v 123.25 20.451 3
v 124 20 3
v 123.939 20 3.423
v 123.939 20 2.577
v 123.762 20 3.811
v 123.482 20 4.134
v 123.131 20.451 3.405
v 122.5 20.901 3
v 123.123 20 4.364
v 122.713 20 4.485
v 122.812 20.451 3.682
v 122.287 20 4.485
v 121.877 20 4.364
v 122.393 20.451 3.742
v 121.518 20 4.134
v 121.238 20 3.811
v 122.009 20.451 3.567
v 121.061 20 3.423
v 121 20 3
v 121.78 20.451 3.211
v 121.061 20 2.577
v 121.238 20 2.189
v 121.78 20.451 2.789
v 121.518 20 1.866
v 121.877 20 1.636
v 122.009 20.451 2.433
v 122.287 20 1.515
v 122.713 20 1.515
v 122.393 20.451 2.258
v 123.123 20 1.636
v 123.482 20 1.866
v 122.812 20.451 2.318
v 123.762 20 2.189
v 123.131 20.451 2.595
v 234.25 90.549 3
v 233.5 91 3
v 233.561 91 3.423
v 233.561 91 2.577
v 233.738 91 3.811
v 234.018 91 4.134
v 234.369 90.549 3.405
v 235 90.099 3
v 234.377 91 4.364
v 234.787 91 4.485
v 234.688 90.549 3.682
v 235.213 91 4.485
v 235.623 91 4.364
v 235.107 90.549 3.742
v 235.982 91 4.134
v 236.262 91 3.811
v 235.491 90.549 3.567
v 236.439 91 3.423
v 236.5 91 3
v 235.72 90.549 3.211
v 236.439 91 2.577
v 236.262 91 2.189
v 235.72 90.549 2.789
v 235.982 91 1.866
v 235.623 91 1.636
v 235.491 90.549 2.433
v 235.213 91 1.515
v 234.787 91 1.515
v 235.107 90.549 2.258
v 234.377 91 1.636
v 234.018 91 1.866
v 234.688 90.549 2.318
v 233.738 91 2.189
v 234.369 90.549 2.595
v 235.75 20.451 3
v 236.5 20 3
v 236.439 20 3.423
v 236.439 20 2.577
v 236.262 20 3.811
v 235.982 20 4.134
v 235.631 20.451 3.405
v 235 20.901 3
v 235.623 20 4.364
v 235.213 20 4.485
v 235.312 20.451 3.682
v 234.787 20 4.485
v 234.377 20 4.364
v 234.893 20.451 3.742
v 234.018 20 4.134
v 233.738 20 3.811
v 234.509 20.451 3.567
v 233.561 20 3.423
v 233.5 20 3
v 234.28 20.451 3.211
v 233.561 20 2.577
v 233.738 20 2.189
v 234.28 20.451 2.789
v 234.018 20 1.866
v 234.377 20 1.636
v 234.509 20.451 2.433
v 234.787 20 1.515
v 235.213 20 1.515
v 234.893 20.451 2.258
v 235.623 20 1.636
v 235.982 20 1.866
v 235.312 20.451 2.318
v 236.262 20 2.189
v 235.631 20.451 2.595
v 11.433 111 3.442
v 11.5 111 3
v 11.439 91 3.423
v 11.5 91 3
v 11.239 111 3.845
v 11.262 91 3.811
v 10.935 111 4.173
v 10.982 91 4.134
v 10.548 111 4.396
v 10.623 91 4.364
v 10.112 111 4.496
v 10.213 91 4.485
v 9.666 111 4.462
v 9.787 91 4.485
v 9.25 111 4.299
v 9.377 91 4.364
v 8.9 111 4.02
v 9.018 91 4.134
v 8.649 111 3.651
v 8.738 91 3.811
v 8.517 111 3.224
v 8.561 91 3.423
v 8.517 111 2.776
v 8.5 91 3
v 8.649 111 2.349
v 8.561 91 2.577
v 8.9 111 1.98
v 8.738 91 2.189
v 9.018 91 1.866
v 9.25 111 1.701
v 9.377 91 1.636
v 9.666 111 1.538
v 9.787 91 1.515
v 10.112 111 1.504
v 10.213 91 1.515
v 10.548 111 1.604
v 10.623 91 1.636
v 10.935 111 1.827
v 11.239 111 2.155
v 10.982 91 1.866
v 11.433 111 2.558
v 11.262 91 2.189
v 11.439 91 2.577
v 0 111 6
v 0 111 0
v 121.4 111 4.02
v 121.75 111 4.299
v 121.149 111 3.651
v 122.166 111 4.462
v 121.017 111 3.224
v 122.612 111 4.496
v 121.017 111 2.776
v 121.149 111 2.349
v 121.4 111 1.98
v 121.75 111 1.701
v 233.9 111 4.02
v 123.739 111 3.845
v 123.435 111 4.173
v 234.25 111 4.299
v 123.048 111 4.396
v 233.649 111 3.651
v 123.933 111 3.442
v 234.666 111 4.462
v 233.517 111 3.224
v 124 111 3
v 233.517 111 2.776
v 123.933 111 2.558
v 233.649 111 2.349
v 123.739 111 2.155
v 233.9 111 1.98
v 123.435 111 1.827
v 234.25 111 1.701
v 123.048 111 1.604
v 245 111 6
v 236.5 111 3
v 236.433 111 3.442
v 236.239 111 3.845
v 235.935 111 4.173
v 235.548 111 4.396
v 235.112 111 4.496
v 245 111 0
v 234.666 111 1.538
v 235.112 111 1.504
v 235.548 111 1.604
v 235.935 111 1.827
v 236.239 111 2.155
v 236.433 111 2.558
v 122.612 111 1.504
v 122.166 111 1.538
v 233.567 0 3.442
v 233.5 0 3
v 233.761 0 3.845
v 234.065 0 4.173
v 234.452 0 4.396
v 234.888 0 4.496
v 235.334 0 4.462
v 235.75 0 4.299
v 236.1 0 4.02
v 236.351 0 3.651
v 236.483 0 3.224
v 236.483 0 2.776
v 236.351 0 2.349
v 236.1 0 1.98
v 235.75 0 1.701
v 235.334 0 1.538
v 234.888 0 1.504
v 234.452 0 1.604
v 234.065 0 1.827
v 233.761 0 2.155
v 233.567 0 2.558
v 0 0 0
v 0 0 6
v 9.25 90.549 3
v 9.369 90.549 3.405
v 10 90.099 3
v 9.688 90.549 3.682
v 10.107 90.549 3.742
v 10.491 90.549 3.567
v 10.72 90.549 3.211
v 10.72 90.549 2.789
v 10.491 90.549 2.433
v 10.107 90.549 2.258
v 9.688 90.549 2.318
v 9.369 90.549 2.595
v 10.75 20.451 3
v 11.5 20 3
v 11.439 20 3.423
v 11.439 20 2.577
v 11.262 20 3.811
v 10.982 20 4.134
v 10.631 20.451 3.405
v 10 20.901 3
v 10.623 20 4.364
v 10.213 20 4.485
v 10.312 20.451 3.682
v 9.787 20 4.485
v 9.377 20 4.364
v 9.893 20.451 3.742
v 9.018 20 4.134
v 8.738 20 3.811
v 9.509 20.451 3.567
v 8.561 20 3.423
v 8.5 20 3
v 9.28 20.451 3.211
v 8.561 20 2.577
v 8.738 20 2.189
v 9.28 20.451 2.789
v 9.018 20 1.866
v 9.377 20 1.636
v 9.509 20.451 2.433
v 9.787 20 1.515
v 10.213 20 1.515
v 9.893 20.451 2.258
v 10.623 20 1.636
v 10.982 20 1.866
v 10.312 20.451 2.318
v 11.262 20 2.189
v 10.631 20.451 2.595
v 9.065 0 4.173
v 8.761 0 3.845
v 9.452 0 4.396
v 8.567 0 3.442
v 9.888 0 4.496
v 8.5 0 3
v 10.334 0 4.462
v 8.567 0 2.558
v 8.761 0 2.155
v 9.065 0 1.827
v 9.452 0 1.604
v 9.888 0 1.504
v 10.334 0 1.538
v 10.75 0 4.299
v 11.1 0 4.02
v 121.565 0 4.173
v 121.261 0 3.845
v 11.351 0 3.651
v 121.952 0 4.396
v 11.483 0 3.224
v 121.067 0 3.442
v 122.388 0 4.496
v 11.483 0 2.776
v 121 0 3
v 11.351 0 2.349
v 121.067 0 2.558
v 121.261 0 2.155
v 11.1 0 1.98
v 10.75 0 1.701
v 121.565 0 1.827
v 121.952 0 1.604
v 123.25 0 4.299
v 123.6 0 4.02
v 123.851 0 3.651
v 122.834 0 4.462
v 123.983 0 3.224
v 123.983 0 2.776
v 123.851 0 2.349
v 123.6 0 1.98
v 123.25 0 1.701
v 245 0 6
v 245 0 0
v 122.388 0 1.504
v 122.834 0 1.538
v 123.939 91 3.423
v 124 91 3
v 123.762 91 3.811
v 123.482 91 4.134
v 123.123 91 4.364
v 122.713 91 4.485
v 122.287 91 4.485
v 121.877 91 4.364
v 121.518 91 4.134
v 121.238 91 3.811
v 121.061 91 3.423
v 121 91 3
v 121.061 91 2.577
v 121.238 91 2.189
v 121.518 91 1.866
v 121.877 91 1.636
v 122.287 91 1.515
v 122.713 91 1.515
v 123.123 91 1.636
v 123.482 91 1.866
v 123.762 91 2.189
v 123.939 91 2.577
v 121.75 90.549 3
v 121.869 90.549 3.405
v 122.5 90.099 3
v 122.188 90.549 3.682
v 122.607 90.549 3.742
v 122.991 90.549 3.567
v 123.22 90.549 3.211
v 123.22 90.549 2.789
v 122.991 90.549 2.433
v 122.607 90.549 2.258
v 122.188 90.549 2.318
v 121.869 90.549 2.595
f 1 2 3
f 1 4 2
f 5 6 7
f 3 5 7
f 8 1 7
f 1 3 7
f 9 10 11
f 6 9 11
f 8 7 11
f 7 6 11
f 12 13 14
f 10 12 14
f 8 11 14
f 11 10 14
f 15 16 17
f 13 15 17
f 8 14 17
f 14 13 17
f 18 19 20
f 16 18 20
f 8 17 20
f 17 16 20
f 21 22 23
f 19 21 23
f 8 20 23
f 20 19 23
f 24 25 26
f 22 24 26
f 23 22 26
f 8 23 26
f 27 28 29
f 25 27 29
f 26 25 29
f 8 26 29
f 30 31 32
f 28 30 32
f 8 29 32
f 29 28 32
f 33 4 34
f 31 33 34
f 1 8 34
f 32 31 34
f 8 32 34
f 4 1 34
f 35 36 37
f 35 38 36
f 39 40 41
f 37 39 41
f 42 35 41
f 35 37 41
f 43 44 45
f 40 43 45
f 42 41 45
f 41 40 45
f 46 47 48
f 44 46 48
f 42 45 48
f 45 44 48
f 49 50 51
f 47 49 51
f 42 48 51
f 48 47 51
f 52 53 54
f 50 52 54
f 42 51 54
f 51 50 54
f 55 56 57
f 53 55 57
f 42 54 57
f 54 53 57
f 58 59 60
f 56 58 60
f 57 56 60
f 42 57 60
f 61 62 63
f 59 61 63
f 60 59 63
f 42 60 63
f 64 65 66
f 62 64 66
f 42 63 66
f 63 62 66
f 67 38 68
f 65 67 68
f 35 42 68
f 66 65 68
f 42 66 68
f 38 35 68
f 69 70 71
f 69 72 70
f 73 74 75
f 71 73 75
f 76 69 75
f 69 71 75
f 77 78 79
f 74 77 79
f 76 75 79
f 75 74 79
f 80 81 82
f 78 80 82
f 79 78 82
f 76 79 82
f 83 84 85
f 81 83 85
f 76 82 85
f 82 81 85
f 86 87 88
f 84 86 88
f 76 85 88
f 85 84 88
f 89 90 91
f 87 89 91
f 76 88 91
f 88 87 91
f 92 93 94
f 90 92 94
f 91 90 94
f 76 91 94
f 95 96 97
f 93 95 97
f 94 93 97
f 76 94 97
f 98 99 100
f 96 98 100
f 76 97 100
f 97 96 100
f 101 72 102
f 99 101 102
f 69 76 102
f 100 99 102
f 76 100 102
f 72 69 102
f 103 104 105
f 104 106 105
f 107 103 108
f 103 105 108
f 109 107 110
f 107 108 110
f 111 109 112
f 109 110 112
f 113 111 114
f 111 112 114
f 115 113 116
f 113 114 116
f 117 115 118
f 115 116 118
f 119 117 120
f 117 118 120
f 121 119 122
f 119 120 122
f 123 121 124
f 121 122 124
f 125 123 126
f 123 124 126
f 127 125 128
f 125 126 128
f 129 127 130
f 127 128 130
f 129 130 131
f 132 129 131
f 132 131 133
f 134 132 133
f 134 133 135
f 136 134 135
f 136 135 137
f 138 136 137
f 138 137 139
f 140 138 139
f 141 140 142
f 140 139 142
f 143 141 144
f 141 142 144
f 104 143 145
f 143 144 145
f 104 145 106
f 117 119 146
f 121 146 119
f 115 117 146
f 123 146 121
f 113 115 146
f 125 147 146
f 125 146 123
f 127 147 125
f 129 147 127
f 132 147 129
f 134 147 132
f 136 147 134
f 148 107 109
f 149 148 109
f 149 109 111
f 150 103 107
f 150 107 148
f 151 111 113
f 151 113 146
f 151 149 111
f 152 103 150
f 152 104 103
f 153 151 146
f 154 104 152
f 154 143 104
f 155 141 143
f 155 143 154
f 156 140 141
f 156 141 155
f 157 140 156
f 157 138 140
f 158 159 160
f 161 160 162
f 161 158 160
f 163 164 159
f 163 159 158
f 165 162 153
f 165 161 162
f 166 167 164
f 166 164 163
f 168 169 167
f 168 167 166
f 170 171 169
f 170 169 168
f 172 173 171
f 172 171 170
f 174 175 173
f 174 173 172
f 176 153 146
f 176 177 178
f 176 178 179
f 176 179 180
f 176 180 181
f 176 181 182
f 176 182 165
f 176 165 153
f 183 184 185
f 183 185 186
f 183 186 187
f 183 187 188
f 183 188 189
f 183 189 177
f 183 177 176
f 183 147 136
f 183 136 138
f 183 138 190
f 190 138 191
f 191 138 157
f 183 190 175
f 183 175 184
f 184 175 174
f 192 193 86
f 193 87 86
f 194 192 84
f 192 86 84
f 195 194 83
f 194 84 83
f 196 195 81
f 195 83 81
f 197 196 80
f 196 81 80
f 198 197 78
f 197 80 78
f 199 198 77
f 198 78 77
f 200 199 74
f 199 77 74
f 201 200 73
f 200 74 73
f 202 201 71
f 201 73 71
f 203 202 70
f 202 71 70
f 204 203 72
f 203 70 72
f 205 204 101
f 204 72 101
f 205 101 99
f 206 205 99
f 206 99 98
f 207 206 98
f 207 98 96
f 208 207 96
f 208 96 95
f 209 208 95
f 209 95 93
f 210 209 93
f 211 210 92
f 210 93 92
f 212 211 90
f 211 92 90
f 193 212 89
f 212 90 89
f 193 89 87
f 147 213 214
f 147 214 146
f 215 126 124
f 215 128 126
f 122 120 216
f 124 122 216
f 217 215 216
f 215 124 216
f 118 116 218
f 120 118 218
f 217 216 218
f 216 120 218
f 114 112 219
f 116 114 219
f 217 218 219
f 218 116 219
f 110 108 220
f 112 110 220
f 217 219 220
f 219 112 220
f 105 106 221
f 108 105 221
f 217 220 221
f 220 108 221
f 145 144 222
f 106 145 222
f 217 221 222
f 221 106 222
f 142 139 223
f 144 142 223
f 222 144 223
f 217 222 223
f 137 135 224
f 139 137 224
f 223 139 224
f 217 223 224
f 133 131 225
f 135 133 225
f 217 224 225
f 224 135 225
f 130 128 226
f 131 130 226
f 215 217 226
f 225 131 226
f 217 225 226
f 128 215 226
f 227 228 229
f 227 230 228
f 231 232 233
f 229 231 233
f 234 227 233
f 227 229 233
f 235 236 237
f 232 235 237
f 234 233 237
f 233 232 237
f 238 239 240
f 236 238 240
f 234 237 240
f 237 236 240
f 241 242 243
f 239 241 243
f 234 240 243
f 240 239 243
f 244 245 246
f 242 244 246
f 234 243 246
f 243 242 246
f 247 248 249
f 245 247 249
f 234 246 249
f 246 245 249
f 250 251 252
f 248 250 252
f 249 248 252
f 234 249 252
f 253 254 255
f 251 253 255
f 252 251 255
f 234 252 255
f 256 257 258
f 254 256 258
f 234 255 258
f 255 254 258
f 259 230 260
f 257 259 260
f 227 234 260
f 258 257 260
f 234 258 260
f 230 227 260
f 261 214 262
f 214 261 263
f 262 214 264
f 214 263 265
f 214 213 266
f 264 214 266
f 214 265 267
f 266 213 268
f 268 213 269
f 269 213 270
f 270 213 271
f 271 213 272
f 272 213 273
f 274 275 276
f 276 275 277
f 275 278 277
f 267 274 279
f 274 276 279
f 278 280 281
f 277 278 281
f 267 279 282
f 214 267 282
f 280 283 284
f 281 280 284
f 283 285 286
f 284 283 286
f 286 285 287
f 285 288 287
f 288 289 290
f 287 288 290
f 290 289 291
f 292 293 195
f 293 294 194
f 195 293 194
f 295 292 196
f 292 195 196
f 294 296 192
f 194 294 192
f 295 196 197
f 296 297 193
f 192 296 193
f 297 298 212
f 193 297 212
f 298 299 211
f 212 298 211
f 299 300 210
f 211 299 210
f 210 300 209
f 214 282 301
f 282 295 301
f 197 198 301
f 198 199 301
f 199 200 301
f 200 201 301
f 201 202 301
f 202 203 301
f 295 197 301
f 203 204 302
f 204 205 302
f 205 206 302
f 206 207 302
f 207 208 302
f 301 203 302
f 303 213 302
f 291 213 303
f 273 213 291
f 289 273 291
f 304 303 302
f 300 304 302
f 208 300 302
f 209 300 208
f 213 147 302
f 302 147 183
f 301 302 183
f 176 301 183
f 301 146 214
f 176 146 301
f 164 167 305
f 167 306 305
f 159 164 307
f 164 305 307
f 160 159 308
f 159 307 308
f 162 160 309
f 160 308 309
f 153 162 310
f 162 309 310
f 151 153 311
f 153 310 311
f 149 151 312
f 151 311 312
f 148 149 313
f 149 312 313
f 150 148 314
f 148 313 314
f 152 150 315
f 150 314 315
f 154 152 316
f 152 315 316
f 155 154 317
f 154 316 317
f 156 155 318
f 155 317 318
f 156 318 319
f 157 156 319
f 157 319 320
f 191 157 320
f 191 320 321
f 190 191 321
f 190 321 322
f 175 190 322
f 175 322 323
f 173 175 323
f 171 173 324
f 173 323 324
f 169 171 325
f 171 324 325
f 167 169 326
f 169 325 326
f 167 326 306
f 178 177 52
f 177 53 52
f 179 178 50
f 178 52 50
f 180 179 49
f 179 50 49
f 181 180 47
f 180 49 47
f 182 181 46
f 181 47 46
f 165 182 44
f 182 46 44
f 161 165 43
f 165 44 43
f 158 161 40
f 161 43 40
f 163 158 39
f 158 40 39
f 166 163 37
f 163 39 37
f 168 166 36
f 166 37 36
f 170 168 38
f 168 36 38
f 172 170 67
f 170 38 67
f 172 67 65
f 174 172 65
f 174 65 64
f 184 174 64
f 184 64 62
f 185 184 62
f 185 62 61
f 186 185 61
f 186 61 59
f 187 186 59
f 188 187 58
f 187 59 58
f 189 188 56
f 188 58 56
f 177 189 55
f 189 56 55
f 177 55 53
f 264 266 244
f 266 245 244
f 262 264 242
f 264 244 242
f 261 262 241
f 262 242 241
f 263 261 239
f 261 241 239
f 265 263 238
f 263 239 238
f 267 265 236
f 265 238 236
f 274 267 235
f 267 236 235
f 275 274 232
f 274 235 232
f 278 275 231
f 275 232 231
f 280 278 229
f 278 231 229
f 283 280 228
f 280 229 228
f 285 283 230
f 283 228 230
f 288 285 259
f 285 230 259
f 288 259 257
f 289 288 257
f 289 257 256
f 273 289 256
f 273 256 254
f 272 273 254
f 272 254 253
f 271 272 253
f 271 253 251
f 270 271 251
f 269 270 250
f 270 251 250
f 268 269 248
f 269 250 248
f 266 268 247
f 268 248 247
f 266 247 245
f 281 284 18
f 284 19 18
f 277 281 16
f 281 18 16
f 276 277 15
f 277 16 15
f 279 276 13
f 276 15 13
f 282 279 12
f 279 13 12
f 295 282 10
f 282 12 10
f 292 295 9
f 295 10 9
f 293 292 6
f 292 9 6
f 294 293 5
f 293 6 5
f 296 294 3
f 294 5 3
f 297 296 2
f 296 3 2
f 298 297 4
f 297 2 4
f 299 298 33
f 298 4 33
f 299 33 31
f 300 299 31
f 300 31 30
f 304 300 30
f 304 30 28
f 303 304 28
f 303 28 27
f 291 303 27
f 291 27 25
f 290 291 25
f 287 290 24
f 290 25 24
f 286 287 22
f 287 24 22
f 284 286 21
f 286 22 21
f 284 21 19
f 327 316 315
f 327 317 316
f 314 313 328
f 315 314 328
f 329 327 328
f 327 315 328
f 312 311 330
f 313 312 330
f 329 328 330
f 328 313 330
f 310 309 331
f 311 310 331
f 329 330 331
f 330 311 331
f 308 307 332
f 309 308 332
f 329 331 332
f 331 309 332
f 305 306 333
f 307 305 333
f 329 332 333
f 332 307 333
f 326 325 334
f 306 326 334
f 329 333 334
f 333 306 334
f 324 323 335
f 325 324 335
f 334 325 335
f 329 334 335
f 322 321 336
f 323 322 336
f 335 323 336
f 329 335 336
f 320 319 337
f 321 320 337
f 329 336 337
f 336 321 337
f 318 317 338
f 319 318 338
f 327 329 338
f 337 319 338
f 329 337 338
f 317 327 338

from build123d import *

# Parameters (mm, degrees)
F0_W     = 245
F0_H     = 111
F1_DEPTH = 6
F3_D     = 3
F3_DEPTH = 20
F3_TIP   = 0.9012909285
F5_D     = 3
F5_DEPTH = 20
F5_TIP   = 0.9012909285


with BuildPart() as f1:
    # F0 (on Top) → F1 (new body)
    with BuildSketch(Plane.XY):
        with Locations((122.5, 55.5)):
            Rectangle(F0_W, F0_H)
    extrude(amount=F1_DEPTH)

    # F3
    with Locations(Plane.XZ):
        with Locations((10, 3), (122.5, 3), (235, 3)):
            Hole(F3_D / 2, depth=F3_DEPTH)
            with Locations((0, 0, -(F3_DEPTH + F3_TIP / 2))):  # 118° drill point
                Cone(0, F3_D / 2, F3_TIP, mode=Mode.SUBTRACT)

    # F5
    with Locations(Plane(origin=(0, 111, 0), x_dir=(-1, 0, 0), z_dir=(0, 1, 0))):
        with Locations((-235, 3), (-122.5, 3), (-10, 3)):
            Hole(F5_D / 2, depth=F5_DEPTH)
            with Locations((0, 0, -(F5_DEPTH + F5_TIP / 2))):  # 118° drill point
                Cone(0, F5_D / 2, F5_TIP, mode=Mode.SUBTRACT)


solid = f1.part
